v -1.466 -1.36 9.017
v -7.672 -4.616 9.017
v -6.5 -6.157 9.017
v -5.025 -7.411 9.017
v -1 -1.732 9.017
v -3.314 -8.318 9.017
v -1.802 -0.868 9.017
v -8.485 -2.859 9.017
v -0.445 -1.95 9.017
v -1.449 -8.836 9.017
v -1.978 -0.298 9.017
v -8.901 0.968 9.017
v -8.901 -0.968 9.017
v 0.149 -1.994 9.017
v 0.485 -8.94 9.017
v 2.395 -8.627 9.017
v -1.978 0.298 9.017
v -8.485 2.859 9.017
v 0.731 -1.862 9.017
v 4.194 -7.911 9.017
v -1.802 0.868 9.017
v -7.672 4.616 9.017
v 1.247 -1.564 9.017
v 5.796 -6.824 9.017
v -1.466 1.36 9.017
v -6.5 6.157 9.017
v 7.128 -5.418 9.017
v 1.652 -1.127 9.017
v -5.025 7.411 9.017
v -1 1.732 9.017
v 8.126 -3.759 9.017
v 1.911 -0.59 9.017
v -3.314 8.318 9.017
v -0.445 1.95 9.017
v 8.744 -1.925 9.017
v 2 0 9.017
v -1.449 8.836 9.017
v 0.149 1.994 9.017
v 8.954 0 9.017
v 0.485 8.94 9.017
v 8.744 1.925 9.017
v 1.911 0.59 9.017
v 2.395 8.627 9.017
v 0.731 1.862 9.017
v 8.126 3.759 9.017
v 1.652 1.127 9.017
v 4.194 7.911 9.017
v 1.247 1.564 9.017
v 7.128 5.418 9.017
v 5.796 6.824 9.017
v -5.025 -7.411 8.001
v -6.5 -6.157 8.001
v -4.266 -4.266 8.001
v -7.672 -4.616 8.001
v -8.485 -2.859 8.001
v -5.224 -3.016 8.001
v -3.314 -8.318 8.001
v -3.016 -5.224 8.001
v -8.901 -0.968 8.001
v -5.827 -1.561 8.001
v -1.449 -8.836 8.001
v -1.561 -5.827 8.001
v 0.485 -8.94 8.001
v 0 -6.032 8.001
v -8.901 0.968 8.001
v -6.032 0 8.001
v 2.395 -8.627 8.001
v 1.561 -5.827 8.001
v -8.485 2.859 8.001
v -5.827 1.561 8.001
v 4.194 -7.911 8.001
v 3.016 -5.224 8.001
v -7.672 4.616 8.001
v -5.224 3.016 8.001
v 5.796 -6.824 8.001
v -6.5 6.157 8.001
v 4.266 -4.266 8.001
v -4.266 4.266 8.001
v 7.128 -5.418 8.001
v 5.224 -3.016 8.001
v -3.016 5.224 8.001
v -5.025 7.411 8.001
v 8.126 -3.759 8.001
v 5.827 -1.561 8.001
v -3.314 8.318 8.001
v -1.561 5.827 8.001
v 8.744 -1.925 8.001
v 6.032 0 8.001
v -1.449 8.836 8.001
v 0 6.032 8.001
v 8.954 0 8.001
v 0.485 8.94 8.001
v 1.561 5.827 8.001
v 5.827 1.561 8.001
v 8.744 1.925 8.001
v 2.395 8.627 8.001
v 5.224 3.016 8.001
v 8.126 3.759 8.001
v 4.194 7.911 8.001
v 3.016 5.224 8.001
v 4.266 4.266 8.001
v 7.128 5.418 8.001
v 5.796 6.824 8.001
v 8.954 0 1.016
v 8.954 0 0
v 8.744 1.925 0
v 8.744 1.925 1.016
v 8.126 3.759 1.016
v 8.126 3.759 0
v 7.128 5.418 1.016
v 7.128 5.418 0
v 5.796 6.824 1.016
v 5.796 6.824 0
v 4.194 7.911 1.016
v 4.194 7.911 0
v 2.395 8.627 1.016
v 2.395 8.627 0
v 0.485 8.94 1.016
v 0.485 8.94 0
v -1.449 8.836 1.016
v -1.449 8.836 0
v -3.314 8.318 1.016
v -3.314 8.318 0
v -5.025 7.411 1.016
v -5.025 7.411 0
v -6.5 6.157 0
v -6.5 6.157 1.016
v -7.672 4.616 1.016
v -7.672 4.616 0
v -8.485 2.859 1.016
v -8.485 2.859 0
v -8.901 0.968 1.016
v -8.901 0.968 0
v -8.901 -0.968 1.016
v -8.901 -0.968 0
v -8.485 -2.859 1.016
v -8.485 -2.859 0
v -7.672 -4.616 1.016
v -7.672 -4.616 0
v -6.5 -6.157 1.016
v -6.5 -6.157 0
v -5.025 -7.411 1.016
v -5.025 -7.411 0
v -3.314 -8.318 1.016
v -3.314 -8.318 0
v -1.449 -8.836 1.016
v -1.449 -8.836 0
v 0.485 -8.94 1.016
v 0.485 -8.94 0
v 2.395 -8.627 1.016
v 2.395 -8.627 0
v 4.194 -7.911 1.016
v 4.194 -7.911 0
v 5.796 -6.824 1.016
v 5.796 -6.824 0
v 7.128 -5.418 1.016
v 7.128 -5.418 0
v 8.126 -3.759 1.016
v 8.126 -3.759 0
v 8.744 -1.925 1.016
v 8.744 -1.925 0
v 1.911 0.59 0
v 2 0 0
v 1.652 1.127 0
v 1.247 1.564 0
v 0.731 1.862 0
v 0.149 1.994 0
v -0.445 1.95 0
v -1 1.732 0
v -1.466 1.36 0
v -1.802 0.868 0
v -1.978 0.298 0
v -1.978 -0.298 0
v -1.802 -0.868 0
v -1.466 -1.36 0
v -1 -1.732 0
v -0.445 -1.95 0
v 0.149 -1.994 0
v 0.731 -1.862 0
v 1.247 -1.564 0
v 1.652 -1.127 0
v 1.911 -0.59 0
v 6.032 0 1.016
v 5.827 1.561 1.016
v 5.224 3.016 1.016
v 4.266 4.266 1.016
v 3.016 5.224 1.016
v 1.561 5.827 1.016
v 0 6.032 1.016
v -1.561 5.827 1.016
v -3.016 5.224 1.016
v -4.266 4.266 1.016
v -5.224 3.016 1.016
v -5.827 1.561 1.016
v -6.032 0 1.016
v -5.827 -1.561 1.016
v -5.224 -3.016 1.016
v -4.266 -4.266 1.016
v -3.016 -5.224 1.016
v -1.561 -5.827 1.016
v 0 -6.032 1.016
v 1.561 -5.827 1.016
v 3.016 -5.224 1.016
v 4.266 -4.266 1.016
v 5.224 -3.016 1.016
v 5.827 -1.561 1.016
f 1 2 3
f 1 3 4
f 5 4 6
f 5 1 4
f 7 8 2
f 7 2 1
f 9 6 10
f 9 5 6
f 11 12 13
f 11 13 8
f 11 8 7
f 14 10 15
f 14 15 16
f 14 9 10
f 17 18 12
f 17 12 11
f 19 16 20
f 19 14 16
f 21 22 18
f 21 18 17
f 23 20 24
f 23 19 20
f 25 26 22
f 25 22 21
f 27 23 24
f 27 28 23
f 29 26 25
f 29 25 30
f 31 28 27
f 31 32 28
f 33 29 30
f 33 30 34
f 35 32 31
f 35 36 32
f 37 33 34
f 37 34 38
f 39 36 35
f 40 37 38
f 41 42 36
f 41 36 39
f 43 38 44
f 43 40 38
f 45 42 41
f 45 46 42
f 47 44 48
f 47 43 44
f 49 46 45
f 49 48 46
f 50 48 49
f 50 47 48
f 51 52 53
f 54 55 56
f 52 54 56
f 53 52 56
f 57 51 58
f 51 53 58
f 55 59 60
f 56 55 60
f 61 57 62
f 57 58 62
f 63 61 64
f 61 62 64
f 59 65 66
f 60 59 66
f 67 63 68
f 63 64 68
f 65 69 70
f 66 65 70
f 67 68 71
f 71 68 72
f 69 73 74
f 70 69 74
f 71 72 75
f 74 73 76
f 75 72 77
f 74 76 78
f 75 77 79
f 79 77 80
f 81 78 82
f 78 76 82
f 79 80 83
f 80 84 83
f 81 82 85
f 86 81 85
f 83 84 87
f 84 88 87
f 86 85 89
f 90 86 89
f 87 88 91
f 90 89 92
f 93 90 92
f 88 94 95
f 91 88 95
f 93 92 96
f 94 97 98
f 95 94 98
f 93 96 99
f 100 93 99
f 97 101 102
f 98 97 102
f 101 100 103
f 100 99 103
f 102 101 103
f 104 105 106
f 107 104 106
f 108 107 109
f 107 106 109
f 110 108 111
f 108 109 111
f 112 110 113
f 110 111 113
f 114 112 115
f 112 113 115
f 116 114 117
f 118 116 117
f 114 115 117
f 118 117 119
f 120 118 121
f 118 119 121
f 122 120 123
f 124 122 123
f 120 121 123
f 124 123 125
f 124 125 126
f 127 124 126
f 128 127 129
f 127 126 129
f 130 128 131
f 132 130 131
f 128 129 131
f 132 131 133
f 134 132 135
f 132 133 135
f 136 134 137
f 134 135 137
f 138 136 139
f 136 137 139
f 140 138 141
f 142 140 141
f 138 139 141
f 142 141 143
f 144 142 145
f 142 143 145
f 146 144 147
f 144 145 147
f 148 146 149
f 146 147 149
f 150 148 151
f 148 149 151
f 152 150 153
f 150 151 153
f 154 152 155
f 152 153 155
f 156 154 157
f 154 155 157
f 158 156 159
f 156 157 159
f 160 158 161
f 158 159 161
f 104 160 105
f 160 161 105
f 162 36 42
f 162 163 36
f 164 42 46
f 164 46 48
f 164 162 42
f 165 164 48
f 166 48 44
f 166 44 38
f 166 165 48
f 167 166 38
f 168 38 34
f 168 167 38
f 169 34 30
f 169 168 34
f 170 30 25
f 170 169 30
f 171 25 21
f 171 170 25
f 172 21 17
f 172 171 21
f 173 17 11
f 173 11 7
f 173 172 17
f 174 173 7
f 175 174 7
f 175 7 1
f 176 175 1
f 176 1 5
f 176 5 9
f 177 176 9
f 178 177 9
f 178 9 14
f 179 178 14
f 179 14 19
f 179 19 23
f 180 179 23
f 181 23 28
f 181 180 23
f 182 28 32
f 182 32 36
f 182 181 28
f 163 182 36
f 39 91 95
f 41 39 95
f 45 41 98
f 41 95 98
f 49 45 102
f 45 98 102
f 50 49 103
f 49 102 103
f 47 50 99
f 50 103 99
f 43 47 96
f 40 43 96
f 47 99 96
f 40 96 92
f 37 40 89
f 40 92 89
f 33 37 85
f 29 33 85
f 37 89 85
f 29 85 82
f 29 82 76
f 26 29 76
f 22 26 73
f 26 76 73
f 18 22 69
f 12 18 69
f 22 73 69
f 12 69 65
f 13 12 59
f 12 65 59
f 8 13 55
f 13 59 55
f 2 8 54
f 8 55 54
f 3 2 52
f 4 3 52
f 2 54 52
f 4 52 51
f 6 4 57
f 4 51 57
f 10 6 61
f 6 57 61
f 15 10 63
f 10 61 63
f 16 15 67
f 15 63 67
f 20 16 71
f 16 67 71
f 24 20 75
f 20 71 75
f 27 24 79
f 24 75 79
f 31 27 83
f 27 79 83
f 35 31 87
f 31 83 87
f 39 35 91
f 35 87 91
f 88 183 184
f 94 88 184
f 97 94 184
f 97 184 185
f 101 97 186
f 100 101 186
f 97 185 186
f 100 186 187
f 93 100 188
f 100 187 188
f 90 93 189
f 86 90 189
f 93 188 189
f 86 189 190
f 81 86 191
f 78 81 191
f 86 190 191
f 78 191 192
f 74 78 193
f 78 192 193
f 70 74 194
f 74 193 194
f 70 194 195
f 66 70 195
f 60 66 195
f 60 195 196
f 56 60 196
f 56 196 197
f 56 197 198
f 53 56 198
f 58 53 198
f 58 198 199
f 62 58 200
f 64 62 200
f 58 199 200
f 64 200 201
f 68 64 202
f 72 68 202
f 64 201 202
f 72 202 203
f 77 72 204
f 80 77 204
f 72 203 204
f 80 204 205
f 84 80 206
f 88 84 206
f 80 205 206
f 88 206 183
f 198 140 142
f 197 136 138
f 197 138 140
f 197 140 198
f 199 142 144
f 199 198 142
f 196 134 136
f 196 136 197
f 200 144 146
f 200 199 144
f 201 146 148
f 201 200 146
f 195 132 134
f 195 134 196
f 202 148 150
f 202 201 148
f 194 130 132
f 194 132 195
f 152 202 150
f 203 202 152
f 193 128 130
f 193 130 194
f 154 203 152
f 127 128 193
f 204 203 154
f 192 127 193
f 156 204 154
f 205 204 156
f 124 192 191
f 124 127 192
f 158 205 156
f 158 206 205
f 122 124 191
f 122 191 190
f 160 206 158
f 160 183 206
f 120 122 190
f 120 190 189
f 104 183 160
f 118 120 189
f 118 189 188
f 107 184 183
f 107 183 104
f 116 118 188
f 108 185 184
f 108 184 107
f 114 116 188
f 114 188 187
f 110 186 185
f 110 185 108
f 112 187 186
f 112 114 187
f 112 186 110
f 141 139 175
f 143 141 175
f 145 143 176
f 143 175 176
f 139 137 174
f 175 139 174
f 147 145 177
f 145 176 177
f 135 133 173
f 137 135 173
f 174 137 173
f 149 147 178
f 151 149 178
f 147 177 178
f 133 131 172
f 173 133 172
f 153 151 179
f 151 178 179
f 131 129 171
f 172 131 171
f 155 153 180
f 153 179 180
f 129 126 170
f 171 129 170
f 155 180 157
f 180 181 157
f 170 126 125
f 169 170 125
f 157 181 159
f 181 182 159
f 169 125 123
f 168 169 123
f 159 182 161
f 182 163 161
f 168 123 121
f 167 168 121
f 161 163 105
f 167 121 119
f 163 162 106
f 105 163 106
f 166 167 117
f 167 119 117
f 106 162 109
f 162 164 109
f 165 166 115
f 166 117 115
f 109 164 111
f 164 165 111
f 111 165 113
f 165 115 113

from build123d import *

# Parameters (mm, degrees)
SKETCH1_R           = 8.9535
SKETCH1_R_2         = 2
BOSS_EXTRUDE1_DEPTH = 1.016
SKETCH2_R           = 6.0325
SKETCH2_R_2         = 2
BOSS_EXTRUDE2_DEPTH = 6.985
SKETCH3_R           = 8.9535
SKETCH3_R_2         = 2
BOSS_EXTRUDE3_DEPTH = 1.016


with BuildPart() as part:
    # Sketch1 → Boss-Extrude1 (new body)
    with BuildSketch(Plane.XY):
        Circle(SKETCH1_R)
        Circle(SKETCH1_R_2, mode=Mode.SUBTRACT)
    extrude(amount=BOSS_EXTRUDE1_DEPTH)

    # Sketch2 → Boss-Extrude2 (add)
    with BuildSketch(Plane.XY.offset(1.016)):
        Circle(SKETCH2_R)
        Circle(SKETCH2_R_2, mode=Mode.SUBTRACT)
    extrude(amount=BOSS_EXTRUDE2_DEPTH)

    # Sketch3 → Boss-Extrude3 (add)
    with BuildSketch(Plane.XY.offset(8.001)):
        Circle(SKETCH3_R)
        Circle(SKETCH3_R_2, mode=Mode.SUBTRACT)
    extrude(amount=BOSS_EXTRUDE3_DEPTH)


solid = part.part
